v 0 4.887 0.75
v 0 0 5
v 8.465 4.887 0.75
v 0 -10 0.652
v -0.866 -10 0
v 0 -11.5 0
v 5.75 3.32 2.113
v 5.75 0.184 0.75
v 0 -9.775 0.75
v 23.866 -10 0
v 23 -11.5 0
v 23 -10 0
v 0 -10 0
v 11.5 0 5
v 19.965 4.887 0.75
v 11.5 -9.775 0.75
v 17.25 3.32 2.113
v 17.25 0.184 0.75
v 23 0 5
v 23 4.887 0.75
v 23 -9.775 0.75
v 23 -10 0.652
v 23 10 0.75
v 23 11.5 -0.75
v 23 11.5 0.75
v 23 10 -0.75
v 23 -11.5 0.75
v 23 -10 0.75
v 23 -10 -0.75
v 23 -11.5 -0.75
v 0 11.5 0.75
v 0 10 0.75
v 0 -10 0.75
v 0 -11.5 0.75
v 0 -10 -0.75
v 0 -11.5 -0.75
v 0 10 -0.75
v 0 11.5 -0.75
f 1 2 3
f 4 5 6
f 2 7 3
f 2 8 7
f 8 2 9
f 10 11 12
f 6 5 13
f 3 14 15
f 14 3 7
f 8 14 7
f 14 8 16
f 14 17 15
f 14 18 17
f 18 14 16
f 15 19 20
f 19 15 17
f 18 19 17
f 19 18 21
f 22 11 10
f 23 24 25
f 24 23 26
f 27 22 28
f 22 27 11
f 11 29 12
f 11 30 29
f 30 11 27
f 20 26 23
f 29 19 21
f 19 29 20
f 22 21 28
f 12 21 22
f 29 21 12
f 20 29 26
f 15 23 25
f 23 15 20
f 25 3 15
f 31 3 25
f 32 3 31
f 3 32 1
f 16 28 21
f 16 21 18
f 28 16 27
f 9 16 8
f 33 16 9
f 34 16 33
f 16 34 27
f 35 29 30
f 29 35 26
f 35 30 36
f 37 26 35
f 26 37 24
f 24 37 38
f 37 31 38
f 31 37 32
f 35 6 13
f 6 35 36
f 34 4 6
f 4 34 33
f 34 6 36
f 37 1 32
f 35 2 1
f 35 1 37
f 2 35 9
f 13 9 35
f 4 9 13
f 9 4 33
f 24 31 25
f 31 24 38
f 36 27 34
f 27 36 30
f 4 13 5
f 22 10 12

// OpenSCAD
$r = 23 / 2;
$r2 = 11 / 2;
$d = 1.5;
$fn = 3;
$links = 2;

difference() {
    union() {
for (i = [0:$links]) {
    
     translate([i * $r, 0, 2.5]) {
        rotate([0, 0, 30]) {
            cylinder(5, $r, 0, true);
        }
     }
}
translate([($links)/2 * $r, 0, 0]) {
     cube([$r * ($links ), $r*2 , $d], true);
}
}
translate([-10, 0, 0]) {
    cube([20, 20, 20], true);
}
translate([($links) * $r + 10, 0, 0]) {
    cube([20, 20, 20], true);
}
}
